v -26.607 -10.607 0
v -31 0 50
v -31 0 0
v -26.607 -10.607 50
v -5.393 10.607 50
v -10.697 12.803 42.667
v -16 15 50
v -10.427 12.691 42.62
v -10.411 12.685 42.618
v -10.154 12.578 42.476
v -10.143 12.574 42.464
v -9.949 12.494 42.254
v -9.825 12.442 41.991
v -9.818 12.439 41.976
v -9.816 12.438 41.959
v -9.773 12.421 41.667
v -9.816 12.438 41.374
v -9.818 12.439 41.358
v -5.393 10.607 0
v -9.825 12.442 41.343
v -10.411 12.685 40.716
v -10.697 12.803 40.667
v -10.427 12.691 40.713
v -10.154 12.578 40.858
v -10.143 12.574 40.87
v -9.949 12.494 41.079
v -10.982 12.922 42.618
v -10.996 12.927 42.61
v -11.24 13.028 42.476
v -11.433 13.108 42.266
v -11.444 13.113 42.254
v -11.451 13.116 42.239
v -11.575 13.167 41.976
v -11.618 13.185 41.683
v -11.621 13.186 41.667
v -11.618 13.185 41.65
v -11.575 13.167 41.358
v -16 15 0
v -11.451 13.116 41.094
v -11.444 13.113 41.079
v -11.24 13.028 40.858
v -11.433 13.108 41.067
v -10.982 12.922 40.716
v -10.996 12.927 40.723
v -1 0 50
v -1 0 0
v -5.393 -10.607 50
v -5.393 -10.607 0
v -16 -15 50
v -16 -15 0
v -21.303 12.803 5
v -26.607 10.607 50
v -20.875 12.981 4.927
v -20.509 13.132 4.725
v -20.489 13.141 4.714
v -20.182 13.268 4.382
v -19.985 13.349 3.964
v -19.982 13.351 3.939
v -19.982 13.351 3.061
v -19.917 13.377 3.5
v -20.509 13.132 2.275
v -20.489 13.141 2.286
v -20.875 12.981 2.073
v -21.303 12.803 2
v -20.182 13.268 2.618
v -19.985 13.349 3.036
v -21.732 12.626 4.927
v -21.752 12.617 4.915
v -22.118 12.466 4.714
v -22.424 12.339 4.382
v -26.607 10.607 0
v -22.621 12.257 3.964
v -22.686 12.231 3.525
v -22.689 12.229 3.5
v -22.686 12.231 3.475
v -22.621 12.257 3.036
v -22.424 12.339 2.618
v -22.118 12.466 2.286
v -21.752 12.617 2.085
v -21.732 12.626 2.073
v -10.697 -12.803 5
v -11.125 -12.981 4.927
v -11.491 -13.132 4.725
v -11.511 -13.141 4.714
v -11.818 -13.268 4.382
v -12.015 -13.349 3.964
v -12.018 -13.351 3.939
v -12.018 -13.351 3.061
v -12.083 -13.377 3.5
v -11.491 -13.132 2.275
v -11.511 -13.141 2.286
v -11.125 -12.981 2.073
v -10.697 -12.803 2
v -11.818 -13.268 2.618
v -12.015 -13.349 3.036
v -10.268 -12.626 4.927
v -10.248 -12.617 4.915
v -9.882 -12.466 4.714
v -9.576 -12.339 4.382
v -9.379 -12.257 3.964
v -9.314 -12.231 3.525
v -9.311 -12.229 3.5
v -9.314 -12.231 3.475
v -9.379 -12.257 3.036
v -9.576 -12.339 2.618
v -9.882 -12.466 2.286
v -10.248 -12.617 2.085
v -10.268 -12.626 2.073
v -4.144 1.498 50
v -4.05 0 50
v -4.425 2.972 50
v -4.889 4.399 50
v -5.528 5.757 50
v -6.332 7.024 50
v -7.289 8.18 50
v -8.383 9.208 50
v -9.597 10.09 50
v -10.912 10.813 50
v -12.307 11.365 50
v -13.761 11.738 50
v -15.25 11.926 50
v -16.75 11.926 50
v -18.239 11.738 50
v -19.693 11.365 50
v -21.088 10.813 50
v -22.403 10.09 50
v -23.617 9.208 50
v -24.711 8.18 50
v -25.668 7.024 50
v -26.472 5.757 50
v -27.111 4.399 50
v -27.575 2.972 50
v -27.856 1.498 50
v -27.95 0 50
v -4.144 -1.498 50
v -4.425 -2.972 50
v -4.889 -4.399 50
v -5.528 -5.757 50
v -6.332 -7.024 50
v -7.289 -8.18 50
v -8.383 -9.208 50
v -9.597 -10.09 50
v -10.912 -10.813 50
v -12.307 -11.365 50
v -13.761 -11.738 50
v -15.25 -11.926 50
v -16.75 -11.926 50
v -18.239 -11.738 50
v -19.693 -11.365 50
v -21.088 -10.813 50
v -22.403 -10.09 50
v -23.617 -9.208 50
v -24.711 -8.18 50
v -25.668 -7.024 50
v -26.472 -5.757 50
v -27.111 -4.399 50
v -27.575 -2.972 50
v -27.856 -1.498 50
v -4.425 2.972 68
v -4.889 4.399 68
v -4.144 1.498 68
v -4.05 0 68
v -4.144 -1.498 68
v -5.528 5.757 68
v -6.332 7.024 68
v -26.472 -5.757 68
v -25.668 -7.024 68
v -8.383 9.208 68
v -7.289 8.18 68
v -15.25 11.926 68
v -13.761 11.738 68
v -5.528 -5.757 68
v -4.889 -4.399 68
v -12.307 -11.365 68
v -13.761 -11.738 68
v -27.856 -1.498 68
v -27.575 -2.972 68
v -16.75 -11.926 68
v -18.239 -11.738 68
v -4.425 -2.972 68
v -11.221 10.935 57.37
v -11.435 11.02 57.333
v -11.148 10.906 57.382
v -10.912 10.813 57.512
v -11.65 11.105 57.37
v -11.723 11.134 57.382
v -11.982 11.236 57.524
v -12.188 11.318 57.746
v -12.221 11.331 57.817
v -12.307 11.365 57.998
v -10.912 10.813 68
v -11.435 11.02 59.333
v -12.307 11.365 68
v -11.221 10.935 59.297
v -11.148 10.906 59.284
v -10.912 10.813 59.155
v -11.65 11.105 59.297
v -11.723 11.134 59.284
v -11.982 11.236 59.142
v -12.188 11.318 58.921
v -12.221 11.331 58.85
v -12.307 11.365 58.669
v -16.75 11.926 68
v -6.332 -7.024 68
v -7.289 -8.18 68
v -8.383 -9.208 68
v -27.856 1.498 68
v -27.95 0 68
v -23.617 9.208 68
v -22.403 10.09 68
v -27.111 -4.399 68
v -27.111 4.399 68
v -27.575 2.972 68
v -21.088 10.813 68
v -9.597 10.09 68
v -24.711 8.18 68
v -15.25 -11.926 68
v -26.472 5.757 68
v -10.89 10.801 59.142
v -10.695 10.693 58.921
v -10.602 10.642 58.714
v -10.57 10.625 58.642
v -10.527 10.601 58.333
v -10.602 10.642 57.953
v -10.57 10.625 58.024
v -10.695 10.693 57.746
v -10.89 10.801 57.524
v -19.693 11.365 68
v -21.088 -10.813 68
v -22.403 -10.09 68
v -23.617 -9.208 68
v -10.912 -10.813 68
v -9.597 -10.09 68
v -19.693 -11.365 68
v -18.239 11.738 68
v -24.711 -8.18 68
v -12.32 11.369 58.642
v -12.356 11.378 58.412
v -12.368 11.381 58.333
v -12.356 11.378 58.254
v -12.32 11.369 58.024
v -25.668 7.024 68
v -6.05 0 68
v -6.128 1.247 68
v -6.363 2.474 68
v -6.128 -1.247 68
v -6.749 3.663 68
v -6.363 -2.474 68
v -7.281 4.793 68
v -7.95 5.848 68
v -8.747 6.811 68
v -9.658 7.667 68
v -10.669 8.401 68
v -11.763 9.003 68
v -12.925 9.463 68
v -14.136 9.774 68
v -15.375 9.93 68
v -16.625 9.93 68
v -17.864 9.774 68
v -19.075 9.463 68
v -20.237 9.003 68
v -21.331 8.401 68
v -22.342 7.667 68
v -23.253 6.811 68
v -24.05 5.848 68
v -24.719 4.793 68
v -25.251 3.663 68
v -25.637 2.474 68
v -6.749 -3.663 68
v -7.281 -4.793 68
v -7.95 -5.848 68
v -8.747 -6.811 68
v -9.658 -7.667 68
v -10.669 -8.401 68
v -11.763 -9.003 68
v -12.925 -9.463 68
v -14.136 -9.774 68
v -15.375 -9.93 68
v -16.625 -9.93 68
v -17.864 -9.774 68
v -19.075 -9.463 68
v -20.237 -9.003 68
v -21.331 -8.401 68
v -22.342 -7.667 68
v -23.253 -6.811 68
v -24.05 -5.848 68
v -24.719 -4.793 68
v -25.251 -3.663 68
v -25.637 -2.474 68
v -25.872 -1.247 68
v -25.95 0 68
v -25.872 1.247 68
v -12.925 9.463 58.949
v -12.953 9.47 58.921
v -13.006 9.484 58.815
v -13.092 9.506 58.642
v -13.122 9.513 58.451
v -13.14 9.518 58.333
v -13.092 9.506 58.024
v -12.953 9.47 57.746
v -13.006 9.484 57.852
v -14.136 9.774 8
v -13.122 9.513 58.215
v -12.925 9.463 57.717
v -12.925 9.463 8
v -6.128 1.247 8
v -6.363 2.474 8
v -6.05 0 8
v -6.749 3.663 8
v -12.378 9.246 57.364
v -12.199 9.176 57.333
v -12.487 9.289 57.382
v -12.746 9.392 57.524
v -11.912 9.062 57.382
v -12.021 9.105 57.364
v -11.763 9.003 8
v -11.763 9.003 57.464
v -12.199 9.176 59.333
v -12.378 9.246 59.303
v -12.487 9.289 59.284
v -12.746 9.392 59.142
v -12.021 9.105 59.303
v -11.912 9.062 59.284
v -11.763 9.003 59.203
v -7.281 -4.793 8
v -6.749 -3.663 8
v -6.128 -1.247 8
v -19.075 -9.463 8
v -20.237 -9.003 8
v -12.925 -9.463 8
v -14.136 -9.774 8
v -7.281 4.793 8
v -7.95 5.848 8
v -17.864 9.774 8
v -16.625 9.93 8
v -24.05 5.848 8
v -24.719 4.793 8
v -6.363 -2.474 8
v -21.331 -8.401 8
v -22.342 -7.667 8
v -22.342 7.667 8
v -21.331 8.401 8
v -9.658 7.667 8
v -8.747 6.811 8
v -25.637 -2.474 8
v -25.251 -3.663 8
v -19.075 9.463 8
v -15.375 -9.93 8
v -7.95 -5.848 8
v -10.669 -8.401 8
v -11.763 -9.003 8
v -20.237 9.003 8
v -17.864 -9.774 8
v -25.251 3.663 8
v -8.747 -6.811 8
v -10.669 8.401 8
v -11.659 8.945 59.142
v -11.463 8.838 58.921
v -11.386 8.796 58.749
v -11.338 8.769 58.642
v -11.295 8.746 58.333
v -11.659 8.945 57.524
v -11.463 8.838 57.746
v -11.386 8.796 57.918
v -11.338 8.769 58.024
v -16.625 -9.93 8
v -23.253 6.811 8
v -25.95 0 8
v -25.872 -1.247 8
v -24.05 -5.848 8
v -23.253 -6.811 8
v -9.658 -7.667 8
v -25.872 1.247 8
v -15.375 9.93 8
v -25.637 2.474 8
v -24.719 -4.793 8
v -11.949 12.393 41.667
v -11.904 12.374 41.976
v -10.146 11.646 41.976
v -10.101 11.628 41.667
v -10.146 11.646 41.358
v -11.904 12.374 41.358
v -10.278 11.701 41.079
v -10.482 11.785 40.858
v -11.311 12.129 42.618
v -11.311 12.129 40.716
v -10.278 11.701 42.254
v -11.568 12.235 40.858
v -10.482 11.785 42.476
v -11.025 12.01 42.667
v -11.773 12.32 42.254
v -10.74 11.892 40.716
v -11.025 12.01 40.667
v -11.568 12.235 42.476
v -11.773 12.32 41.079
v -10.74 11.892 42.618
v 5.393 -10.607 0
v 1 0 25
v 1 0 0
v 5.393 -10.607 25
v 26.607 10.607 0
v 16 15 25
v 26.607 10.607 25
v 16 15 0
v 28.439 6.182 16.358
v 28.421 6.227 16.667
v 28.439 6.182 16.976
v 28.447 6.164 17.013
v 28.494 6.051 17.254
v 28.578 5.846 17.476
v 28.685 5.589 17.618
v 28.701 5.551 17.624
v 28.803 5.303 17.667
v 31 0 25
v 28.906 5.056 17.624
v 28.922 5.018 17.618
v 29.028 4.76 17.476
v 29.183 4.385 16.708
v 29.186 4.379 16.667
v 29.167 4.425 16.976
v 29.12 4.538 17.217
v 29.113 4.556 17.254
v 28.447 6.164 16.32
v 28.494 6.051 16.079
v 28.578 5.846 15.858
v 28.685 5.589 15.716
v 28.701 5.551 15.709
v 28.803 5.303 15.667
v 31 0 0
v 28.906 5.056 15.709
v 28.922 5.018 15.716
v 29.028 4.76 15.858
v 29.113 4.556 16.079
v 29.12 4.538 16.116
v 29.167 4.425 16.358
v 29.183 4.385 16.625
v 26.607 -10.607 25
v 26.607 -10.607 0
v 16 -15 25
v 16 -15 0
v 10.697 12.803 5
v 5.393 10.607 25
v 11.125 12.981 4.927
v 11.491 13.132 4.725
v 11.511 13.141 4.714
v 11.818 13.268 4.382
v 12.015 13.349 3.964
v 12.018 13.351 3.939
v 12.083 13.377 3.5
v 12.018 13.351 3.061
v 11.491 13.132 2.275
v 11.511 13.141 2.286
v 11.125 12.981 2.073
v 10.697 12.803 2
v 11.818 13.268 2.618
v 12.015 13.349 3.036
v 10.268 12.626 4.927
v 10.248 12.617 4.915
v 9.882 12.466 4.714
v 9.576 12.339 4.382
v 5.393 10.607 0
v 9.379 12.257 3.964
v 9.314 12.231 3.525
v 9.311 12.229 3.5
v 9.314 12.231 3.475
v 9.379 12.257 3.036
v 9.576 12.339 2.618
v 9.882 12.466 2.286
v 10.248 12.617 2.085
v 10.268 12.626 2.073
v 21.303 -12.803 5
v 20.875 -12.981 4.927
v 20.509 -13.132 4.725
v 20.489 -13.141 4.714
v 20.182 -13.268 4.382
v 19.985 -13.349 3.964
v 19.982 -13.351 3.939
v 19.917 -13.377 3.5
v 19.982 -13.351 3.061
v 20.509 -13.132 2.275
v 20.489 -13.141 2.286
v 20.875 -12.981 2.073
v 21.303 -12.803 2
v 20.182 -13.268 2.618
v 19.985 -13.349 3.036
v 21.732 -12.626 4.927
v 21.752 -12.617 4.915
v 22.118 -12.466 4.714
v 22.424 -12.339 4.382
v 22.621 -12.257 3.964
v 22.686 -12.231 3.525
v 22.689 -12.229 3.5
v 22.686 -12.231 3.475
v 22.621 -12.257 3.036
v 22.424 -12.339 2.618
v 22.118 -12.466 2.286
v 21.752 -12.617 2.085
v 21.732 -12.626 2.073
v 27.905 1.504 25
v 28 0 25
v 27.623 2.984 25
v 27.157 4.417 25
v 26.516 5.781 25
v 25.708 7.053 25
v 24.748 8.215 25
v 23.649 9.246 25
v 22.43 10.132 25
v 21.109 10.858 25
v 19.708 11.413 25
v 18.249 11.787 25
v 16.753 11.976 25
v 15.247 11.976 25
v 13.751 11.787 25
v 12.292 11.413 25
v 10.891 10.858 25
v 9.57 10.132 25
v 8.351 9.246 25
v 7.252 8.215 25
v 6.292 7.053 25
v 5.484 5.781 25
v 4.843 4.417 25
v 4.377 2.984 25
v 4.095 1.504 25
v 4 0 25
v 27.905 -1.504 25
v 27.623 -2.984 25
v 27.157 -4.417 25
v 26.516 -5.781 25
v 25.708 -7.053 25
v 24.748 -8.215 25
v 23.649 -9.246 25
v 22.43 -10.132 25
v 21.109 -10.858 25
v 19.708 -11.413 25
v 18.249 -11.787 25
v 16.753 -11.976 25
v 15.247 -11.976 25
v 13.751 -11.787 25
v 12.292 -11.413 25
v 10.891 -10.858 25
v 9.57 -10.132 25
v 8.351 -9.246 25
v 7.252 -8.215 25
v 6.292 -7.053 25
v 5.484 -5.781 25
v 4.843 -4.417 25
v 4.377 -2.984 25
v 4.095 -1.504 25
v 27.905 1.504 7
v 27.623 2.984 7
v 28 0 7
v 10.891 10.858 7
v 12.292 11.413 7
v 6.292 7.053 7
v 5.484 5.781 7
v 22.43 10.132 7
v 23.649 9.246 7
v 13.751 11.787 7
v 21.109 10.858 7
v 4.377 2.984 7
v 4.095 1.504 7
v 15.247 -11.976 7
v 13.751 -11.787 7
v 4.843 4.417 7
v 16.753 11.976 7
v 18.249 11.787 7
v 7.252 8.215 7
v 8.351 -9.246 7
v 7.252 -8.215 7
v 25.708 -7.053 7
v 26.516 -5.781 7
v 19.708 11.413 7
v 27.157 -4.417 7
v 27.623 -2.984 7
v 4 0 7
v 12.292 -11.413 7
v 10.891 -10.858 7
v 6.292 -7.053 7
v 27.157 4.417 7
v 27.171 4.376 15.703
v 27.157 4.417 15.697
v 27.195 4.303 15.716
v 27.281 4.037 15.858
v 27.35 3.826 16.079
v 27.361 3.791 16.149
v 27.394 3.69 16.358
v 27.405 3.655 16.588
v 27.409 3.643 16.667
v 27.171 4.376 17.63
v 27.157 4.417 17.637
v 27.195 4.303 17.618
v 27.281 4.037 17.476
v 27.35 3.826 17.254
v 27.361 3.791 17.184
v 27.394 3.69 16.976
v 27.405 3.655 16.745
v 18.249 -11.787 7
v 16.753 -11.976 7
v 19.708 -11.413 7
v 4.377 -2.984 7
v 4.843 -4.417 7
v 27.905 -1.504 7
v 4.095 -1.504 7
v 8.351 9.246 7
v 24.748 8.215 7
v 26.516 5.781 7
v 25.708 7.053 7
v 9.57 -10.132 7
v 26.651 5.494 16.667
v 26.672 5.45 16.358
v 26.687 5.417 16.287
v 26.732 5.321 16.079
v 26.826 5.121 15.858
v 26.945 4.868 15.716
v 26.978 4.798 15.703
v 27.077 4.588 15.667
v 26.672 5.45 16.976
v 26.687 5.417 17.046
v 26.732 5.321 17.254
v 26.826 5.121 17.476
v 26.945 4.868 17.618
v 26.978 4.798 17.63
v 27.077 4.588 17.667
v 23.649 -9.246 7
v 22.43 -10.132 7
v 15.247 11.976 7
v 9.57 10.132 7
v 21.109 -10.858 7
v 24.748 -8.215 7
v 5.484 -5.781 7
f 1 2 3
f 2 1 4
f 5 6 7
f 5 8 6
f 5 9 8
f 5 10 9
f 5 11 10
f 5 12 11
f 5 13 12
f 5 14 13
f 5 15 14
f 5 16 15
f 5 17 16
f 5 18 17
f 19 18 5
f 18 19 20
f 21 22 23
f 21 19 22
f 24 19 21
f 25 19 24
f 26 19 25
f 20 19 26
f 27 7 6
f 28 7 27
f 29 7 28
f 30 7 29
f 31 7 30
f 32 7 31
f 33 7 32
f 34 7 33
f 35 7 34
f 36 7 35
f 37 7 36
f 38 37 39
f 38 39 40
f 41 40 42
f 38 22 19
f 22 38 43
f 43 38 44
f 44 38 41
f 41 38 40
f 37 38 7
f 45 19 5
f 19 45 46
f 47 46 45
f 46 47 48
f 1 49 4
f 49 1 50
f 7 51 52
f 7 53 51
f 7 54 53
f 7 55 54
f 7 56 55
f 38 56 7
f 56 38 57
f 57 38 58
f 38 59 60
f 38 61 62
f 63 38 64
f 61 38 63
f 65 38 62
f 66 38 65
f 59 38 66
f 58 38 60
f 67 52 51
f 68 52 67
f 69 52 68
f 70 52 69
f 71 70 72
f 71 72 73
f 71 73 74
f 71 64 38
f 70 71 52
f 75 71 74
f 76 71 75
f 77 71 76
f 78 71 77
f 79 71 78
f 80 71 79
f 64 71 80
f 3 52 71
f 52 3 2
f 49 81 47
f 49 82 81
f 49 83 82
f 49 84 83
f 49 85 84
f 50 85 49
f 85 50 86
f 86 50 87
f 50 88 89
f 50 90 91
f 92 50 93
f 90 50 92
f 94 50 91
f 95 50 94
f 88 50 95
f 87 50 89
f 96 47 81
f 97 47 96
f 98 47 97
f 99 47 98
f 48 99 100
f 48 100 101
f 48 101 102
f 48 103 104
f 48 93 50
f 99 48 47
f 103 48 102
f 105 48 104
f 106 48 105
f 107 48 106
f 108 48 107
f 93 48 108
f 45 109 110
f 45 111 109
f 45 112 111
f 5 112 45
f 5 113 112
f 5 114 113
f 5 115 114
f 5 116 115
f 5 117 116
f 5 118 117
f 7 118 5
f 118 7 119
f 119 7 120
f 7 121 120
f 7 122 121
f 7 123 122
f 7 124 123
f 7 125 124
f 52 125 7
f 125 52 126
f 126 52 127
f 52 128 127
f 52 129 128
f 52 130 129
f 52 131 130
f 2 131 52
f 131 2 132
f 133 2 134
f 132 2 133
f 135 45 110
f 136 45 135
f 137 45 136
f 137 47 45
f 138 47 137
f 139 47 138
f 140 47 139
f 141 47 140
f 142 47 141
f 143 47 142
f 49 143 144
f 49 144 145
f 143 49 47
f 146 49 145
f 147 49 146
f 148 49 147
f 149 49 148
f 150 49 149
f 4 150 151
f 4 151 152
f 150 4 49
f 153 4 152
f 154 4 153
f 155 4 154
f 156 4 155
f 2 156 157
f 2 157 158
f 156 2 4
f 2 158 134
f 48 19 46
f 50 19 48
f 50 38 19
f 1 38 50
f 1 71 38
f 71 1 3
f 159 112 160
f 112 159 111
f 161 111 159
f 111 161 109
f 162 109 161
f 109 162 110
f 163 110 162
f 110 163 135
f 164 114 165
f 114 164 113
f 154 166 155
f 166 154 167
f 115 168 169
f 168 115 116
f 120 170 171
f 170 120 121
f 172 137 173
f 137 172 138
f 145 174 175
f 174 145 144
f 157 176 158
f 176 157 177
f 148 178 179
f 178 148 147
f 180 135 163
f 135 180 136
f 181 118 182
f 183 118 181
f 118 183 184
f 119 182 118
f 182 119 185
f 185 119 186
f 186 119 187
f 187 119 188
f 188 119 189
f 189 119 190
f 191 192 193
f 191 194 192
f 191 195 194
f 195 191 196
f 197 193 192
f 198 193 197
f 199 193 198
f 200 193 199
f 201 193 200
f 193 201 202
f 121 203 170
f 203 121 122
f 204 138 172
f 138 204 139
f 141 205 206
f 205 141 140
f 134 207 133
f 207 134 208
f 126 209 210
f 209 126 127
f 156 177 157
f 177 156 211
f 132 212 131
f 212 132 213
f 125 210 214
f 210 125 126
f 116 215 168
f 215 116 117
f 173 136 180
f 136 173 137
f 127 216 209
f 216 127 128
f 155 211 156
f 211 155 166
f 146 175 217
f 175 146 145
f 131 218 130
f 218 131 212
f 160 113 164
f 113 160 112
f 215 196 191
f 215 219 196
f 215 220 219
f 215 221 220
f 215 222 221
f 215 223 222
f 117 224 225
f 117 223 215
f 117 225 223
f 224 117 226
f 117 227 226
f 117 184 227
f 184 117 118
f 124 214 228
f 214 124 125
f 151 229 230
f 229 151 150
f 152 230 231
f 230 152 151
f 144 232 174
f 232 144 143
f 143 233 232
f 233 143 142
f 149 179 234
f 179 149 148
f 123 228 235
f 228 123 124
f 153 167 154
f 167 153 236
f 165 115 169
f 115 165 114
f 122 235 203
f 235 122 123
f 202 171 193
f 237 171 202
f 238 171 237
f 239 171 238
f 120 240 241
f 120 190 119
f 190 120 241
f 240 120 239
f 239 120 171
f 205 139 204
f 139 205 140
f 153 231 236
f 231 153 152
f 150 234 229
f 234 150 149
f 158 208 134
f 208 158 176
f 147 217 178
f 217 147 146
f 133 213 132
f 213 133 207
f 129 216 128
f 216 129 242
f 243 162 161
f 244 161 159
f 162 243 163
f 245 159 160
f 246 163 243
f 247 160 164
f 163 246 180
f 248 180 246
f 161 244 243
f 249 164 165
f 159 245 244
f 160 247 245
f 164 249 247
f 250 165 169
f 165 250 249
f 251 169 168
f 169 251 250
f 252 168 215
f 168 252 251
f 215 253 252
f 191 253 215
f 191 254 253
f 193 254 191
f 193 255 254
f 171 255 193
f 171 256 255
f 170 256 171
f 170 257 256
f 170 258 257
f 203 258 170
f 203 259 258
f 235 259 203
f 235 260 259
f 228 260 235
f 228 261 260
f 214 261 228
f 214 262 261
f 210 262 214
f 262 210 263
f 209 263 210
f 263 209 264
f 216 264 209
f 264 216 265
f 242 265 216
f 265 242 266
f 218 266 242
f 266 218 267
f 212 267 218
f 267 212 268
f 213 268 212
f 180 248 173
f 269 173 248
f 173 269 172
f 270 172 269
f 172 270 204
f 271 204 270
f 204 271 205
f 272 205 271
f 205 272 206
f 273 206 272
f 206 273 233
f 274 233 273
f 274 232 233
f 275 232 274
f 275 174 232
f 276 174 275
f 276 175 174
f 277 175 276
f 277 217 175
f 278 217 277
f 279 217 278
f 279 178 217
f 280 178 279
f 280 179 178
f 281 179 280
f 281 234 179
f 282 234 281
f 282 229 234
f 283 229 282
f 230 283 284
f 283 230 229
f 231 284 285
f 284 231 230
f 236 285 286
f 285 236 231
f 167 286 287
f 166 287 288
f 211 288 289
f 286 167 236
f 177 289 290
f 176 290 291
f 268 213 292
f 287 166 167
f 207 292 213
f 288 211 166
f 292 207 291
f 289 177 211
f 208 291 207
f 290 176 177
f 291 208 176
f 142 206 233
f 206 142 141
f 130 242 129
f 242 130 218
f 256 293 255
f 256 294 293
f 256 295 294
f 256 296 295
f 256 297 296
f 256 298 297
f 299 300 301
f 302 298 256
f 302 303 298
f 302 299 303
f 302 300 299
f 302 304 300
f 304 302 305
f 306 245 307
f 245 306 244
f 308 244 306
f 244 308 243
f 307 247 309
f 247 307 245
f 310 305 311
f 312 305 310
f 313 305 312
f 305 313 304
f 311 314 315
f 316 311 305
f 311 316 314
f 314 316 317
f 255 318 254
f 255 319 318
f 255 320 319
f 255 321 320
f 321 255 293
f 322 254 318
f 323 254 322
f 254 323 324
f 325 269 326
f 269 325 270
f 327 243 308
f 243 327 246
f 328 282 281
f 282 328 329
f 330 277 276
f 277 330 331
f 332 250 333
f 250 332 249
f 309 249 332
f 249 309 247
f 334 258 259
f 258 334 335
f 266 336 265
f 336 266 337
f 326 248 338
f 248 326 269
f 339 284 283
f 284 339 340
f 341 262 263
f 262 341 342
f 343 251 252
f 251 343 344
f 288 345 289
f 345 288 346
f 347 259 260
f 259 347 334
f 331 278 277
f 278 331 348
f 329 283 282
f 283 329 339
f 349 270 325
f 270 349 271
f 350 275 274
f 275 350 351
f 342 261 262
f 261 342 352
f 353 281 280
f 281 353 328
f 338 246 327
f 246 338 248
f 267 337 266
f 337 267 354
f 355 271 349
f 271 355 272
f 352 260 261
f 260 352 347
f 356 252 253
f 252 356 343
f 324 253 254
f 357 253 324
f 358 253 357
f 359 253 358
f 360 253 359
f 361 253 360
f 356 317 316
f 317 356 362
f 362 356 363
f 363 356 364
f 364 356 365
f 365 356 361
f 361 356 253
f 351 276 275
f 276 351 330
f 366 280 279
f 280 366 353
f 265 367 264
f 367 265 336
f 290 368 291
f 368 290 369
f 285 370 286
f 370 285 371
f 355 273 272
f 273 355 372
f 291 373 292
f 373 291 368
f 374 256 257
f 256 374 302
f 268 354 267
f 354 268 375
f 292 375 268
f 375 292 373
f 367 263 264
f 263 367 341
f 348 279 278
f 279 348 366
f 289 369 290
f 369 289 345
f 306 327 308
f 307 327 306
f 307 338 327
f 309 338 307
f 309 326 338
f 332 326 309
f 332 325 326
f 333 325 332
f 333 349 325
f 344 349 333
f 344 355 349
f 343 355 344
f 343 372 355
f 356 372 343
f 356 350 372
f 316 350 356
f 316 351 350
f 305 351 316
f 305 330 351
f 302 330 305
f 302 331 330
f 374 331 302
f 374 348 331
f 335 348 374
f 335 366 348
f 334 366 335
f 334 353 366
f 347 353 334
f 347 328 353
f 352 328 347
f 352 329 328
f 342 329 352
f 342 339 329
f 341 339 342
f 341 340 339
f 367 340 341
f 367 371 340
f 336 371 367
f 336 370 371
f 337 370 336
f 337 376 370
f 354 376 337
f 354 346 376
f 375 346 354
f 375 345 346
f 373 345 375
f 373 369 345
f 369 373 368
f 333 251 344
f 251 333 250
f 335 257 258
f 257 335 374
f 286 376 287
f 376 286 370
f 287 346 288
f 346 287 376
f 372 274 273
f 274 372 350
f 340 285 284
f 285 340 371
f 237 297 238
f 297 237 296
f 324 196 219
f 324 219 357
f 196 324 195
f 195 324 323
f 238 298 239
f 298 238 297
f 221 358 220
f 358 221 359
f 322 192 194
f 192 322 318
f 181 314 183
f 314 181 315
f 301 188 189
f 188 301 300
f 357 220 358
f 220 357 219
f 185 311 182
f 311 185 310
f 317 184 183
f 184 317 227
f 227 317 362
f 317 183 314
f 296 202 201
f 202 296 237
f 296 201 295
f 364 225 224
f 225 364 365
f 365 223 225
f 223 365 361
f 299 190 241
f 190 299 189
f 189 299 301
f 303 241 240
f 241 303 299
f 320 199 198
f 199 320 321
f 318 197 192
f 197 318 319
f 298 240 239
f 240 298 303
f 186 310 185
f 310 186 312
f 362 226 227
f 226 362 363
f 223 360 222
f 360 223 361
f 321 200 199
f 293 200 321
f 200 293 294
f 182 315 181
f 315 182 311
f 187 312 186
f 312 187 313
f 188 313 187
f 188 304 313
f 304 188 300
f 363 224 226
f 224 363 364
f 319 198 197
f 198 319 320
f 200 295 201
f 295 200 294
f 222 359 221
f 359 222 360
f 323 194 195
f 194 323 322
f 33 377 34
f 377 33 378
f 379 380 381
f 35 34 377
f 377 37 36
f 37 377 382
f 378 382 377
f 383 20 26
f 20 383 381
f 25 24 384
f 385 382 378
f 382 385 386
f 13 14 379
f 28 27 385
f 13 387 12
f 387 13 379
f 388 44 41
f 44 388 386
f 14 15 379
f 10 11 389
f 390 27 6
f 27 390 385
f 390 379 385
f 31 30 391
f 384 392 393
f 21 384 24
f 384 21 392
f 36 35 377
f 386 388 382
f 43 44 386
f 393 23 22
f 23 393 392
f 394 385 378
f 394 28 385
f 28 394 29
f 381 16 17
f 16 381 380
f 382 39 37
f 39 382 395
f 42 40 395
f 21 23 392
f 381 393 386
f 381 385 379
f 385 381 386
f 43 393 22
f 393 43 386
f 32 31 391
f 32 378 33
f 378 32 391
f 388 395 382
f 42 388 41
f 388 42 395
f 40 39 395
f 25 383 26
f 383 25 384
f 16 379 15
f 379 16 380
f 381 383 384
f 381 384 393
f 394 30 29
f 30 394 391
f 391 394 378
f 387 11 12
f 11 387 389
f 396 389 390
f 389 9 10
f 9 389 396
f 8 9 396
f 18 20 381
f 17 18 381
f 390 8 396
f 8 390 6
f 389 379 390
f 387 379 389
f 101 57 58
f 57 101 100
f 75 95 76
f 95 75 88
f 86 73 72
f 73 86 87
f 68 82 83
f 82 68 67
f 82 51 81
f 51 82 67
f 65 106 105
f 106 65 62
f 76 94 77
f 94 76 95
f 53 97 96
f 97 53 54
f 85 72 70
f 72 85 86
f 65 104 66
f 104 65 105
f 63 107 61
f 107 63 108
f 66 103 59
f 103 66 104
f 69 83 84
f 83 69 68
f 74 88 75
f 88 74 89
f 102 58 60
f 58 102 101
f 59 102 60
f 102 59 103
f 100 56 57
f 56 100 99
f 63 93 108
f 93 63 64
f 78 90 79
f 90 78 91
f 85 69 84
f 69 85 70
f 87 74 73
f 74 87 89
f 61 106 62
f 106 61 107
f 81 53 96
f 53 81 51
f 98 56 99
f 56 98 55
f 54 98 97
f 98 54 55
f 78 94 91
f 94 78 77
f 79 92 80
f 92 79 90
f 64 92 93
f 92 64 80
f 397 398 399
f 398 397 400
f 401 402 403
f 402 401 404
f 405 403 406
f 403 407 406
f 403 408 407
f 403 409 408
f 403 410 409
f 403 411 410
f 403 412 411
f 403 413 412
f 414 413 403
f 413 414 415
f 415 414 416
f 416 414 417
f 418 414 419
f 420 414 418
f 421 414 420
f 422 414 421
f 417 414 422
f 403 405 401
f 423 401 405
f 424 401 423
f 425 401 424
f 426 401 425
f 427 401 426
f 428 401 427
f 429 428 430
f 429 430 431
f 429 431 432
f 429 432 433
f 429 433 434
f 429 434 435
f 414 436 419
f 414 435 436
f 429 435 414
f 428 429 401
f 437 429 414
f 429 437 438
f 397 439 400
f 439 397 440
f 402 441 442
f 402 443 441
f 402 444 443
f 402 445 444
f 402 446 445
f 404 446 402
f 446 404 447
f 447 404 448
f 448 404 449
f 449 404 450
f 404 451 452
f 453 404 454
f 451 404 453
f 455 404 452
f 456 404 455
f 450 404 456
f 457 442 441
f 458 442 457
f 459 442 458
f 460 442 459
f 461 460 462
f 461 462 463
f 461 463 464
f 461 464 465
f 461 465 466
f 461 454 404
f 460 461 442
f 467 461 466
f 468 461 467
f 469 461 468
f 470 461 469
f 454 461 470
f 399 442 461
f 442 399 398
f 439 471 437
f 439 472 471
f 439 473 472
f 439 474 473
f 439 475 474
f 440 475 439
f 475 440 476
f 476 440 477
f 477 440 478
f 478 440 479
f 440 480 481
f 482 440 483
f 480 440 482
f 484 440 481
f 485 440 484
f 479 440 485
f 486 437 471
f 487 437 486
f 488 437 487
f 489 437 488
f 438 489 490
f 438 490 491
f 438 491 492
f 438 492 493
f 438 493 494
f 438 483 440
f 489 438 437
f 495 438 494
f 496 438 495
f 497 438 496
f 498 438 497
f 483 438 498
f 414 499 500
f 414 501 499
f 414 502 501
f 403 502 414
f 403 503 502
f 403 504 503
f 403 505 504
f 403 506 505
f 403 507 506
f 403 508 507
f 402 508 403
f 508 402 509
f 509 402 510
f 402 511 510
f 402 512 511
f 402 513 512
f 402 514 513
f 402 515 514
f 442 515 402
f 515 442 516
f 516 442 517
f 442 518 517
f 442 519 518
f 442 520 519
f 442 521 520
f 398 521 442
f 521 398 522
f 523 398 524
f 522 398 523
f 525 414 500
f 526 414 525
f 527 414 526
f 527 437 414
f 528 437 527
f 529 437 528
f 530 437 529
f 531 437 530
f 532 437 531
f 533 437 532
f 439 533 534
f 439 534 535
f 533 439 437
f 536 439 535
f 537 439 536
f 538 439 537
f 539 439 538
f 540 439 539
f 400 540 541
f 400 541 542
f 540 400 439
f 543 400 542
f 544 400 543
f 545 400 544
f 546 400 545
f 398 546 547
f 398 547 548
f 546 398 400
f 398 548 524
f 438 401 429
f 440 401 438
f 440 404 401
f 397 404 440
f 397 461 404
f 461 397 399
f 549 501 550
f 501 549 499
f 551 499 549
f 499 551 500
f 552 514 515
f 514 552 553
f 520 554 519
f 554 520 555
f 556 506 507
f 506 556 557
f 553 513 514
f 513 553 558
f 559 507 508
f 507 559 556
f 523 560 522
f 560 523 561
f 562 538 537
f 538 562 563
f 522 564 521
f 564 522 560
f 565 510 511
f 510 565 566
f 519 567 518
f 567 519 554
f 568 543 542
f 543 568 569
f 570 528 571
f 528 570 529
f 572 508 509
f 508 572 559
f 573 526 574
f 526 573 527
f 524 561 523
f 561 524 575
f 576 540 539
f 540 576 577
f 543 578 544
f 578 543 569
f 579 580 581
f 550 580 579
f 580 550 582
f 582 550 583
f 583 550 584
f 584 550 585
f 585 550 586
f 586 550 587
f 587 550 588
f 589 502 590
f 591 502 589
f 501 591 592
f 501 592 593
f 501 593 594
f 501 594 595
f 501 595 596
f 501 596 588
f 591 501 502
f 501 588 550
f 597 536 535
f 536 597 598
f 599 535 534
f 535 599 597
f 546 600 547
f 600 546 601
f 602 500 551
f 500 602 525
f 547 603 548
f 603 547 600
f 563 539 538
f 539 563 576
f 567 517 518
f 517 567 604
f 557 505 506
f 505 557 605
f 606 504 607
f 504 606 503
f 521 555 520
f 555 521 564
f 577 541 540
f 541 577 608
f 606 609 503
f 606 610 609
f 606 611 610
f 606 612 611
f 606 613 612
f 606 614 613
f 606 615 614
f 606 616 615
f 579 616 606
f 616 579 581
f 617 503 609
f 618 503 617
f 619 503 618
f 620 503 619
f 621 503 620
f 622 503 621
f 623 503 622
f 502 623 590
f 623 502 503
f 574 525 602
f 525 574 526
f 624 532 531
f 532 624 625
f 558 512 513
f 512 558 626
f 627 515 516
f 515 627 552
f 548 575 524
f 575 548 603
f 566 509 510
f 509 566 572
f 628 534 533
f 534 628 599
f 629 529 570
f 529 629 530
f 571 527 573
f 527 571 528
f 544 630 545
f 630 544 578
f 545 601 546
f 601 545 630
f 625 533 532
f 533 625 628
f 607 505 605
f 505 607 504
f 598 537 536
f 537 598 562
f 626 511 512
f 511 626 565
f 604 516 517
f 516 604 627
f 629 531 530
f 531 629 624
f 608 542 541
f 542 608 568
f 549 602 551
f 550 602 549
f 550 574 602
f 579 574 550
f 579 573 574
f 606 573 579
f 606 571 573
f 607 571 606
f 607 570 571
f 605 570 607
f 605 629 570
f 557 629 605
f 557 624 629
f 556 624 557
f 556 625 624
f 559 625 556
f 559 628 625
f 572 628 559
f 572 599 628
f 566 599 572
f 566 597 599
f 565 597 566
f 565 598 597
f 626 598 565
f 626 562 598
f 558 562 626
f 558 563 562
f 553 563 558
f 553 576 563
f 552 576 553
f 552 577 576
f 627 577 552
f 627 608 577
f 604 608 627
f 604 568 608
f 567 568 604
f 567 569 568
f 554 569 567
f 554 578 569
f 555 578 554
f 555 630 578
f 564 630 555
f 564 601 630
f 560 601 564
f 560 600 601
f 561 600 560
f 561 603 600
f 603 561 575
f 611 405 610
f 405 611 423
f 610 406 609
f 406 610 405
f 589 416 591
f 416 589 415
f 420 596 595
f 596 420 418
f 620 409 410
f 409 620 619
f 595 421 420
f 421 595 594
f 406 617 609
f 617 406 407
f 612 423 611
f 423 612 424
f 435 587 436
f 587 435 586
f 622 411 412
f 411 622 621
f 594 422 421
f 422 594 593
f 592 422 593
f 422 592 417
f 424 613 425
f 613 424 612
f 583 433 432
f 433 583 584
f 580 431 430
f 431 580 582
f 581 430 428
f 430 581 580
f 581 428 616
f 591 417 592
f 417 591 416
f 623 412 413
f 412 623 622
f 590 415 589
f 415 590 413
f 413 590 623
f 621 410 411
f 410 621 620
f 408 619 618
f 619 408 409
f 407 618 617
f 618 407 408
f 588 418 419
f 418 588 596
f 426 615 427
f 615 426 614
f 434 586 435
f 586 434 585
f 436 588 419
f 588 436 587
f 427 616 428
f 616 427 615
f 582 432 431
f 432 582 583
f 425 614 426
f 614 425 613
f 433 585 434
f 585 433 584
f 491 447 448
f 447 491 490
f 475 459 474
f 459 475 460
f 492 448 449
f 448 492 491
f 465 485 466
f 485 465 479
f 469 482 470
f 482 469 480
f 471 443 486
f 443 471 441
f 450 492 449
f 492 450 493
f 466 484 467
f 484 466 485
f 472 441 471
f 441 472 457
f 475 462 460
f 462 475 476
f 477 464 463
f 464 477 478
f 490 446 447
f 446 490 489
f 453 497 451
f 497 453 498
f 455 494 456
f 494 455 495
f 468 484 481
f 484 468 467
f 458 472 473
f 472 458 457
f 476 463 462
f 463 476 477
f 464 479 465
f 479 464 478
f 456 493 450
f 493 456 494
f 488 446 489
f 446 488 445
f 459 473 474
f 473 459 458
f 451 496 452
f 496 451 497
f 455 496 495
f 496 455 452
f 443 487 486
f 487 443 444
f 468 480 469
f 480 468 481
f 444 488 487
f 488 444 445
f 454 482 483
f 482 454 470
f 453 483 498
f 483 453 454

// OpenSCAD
// Which parts would you like to see?
part = "both"; // [container:Container Only,lid:Lid Only,both:Both Container and Lid]

// What type of container would you like to make?
variant = 30; // [22:Giriko-ire(22mm),30:Fudeko-ire(30mm),35:Large Fudeko-ire(35mm)]
variant_radius=variant/2;

// How many sides?
shape = 8; // [8:Eight sides,12:Twelve sides,100:Round]

// How thick should the walls be? (mm)
wall_thickness = 2; // [1:4]

// Diameter of the string hole. (mm)
string_hole_diameter = 3; // [0:No hole,1:1mm,1.5:1.5mm,2:2mm,3:3mm,4:4mm,5:5mm]

// Diameter of the hole.
hole_diameter = 2; // [0:No hole,1:1mm,1.5:1.5mm,2:2mm,3:3mm,4:4mm,5:5mm]

// How much tolerance between the lid and container?
tolerance = 0.05; // [0.05,0.06,0.07,0.08,0.09,0.1,0.15,0.2,0.3,0.4,0.5]

angle_between_holes = shape==100?45:(360/shape);

half_angle_between_holes=angle_between_holes/2;

hole_radius = hole_diameter==0?0:hole_diameter/2;
string_hole_radius = string_hole_diameter==0?0:string_hole_diameter/2;

height = variant*2.5;
segment = height/3;
overlap = segment-(string_hole_diameter+4);


print_part();

module print_part() {
	if (part == "container") {
		container();
	} else if (part == "lid") {
		lid();
	} else if (part == "both") {
		both();
	} else {
		both();
	}
}

module both() {
	translate([-(variant_radius+1), 0, 0]) container();
	translate([variant_radius+1, 0, 0]) lid();
}

module container() {
	difference(){
		union(){
			//outer shape
			cylinder(r=variant_radius, h=segment*2, $fn=shape); 
			//overlap cylinder
			translate([0, 0, segment*2]) cylinder(r=variant_radius-(wall_thickness+1+tolerance), h=overlap, $fn=50);
		}
		// inside of container
		translate([0, 0, string_hole_diameter+5])cylinder(r=variant_radius-(wall_thickness+1+tolerance)-2, h=(segment*2)+overlap+2, $fn=50);
		// hole
		translate([0, 0, segment*2+(segment/3)]) rotate([90,0,half_angle_between_holes+angle_between_holes+90]) cylinder(r=hole_radius, h=variant_radius+1, $fn=20);
		// marker
		translate([0, 0, segment*2-(segment/3)]) rotate([90,0,half_angle_between_holes+angle_between_holes+90]) translate([0,0,variant_radius-2]) cylinder(r=hole_radius, h=variant_radius+1, $fn=20);
		// string hole
		translate([0, 0, string_hole_radius+2]) rotate([90,0,half_angle_between_holes]) cylinder(r=string_hole_radius, h=variant+1,center=true, $fn=20);

	}
}

module lid() {
	difference(){
		// outer shape
		cylinder(r=variant_radius, h=segment, $fn=shape);
		// cut-out cylinder
		translate([0, 0, string_hole_diameter+4]) cylinder(r=variant_radius-(wall_thickness+1), h=overlap+1, $fn=50);
		// hole 
		translate([0, 0, segment/3*2]) rotate([90,0,half_angle_between_holes+90]) cylinder(r=hole_radius, h=variant_radius+1, $fn=20);
		// string hole
		translate([0, 0, string_hole_radius+2]) rotate([90,0,half_angle_between_holes]) cylinder(r=string_hole_radius, h=variant+1,center=true, $fn=20);
	}
}
